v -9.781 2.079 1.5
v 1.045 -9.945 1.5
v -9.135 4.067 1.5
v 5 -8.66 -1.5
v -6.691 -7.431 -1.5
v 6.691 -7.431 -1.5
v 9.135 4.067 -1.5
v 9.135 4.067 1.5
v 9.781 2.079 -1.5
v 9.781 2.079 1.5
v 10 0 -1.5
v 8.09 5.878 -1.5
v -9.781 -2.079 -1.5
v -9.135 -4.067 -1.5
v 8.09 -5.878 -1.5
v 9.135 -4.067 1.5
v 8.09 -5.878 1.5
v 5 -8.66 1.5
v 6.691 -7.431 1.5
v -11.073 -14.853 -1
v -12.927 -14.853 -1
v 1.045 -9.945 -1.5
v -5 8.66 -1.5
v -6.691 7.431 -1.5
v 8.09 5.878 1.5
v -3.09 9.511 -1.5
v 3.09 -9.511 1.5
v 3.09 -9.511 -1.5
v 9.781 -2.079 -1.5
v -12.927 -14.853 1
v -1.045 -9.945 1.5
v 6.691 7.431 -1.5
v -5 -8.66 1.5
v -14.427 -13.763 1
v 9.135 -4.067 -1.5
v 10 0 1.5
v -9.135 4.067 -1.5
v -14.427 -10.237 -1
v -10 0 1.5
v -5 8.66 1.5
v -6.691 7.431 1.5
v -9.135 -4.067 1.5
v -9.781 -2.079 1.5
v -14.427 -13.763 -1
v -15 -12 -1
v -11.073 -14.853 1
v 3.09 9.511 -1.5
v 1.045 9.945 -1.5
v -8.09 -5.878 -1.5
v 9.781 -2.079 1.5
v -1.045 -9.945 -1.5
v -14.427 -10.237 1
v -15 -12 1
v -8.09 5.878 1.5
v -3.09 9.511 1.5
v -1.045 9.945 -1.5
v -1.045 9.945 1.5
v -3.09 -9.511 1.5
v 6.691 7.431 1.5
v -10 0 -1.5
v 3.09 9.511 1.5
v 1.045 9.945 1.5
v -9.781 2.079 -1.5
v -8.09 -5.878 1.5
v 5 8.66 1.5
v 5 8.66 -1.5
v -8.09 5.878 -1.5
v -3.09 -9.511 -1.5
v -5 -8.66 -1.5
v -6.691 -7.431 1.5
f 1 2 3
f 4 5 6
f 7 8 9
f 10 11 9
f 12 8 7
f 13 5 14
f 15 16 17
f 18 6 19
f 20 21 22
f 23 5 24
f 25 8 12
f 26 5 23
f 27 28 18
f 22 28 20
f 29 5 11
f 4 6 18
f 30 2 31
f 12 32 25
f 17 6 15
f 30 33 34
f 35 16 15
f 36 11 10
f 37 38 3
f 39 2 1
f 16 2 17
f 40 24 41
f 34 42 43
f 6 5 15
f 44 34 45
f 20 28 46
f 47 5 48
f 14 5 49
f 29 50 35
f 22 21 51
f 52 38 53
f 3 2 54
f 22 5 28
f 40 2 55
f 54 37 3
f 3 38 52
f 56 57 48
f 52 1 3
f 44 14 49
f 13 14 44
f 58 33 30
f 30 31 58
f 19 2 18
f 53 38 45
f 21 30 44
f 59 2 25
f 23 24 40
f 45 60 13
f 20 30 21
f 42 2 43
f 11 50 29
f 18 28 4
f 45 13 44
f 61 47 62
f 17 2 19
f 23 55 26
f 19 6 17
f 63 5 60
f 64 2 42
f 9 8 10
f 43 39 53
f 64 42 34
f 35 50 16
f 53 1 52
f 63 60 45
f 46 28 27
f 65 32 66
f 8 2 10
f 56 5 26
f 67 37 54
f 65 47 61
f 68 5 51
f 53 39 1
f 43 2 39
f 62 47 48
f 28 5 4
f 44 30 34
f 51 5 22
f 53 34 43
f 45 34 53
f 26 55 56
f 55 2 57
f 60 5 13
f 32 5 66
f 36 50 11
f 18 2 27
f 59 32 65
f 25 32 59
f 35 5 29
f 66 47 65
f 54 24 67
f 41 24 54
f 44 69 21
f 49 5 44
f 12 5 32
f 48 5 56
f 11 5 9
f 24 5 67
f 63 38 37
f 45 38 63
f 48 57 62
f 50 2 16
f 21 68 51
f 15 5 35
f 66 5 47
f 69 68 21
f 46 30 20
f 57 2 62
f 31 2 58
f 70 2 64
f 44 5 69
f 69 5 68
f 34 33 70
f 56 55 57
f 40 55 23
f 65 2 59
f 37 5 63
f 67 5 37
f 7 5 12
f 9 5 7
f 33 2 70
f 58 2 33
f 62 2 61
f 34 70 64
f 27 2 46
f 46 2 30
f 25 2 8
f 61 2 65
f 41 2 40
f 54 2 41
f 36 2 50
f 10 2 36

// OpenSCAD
minkowski() {
  hull() {
    cylinder(r=10, h=3, center=true);
    translate([-12, -12, 0]) {
      cylinder(r=3, h=2, center=true);
    }
  }
}
